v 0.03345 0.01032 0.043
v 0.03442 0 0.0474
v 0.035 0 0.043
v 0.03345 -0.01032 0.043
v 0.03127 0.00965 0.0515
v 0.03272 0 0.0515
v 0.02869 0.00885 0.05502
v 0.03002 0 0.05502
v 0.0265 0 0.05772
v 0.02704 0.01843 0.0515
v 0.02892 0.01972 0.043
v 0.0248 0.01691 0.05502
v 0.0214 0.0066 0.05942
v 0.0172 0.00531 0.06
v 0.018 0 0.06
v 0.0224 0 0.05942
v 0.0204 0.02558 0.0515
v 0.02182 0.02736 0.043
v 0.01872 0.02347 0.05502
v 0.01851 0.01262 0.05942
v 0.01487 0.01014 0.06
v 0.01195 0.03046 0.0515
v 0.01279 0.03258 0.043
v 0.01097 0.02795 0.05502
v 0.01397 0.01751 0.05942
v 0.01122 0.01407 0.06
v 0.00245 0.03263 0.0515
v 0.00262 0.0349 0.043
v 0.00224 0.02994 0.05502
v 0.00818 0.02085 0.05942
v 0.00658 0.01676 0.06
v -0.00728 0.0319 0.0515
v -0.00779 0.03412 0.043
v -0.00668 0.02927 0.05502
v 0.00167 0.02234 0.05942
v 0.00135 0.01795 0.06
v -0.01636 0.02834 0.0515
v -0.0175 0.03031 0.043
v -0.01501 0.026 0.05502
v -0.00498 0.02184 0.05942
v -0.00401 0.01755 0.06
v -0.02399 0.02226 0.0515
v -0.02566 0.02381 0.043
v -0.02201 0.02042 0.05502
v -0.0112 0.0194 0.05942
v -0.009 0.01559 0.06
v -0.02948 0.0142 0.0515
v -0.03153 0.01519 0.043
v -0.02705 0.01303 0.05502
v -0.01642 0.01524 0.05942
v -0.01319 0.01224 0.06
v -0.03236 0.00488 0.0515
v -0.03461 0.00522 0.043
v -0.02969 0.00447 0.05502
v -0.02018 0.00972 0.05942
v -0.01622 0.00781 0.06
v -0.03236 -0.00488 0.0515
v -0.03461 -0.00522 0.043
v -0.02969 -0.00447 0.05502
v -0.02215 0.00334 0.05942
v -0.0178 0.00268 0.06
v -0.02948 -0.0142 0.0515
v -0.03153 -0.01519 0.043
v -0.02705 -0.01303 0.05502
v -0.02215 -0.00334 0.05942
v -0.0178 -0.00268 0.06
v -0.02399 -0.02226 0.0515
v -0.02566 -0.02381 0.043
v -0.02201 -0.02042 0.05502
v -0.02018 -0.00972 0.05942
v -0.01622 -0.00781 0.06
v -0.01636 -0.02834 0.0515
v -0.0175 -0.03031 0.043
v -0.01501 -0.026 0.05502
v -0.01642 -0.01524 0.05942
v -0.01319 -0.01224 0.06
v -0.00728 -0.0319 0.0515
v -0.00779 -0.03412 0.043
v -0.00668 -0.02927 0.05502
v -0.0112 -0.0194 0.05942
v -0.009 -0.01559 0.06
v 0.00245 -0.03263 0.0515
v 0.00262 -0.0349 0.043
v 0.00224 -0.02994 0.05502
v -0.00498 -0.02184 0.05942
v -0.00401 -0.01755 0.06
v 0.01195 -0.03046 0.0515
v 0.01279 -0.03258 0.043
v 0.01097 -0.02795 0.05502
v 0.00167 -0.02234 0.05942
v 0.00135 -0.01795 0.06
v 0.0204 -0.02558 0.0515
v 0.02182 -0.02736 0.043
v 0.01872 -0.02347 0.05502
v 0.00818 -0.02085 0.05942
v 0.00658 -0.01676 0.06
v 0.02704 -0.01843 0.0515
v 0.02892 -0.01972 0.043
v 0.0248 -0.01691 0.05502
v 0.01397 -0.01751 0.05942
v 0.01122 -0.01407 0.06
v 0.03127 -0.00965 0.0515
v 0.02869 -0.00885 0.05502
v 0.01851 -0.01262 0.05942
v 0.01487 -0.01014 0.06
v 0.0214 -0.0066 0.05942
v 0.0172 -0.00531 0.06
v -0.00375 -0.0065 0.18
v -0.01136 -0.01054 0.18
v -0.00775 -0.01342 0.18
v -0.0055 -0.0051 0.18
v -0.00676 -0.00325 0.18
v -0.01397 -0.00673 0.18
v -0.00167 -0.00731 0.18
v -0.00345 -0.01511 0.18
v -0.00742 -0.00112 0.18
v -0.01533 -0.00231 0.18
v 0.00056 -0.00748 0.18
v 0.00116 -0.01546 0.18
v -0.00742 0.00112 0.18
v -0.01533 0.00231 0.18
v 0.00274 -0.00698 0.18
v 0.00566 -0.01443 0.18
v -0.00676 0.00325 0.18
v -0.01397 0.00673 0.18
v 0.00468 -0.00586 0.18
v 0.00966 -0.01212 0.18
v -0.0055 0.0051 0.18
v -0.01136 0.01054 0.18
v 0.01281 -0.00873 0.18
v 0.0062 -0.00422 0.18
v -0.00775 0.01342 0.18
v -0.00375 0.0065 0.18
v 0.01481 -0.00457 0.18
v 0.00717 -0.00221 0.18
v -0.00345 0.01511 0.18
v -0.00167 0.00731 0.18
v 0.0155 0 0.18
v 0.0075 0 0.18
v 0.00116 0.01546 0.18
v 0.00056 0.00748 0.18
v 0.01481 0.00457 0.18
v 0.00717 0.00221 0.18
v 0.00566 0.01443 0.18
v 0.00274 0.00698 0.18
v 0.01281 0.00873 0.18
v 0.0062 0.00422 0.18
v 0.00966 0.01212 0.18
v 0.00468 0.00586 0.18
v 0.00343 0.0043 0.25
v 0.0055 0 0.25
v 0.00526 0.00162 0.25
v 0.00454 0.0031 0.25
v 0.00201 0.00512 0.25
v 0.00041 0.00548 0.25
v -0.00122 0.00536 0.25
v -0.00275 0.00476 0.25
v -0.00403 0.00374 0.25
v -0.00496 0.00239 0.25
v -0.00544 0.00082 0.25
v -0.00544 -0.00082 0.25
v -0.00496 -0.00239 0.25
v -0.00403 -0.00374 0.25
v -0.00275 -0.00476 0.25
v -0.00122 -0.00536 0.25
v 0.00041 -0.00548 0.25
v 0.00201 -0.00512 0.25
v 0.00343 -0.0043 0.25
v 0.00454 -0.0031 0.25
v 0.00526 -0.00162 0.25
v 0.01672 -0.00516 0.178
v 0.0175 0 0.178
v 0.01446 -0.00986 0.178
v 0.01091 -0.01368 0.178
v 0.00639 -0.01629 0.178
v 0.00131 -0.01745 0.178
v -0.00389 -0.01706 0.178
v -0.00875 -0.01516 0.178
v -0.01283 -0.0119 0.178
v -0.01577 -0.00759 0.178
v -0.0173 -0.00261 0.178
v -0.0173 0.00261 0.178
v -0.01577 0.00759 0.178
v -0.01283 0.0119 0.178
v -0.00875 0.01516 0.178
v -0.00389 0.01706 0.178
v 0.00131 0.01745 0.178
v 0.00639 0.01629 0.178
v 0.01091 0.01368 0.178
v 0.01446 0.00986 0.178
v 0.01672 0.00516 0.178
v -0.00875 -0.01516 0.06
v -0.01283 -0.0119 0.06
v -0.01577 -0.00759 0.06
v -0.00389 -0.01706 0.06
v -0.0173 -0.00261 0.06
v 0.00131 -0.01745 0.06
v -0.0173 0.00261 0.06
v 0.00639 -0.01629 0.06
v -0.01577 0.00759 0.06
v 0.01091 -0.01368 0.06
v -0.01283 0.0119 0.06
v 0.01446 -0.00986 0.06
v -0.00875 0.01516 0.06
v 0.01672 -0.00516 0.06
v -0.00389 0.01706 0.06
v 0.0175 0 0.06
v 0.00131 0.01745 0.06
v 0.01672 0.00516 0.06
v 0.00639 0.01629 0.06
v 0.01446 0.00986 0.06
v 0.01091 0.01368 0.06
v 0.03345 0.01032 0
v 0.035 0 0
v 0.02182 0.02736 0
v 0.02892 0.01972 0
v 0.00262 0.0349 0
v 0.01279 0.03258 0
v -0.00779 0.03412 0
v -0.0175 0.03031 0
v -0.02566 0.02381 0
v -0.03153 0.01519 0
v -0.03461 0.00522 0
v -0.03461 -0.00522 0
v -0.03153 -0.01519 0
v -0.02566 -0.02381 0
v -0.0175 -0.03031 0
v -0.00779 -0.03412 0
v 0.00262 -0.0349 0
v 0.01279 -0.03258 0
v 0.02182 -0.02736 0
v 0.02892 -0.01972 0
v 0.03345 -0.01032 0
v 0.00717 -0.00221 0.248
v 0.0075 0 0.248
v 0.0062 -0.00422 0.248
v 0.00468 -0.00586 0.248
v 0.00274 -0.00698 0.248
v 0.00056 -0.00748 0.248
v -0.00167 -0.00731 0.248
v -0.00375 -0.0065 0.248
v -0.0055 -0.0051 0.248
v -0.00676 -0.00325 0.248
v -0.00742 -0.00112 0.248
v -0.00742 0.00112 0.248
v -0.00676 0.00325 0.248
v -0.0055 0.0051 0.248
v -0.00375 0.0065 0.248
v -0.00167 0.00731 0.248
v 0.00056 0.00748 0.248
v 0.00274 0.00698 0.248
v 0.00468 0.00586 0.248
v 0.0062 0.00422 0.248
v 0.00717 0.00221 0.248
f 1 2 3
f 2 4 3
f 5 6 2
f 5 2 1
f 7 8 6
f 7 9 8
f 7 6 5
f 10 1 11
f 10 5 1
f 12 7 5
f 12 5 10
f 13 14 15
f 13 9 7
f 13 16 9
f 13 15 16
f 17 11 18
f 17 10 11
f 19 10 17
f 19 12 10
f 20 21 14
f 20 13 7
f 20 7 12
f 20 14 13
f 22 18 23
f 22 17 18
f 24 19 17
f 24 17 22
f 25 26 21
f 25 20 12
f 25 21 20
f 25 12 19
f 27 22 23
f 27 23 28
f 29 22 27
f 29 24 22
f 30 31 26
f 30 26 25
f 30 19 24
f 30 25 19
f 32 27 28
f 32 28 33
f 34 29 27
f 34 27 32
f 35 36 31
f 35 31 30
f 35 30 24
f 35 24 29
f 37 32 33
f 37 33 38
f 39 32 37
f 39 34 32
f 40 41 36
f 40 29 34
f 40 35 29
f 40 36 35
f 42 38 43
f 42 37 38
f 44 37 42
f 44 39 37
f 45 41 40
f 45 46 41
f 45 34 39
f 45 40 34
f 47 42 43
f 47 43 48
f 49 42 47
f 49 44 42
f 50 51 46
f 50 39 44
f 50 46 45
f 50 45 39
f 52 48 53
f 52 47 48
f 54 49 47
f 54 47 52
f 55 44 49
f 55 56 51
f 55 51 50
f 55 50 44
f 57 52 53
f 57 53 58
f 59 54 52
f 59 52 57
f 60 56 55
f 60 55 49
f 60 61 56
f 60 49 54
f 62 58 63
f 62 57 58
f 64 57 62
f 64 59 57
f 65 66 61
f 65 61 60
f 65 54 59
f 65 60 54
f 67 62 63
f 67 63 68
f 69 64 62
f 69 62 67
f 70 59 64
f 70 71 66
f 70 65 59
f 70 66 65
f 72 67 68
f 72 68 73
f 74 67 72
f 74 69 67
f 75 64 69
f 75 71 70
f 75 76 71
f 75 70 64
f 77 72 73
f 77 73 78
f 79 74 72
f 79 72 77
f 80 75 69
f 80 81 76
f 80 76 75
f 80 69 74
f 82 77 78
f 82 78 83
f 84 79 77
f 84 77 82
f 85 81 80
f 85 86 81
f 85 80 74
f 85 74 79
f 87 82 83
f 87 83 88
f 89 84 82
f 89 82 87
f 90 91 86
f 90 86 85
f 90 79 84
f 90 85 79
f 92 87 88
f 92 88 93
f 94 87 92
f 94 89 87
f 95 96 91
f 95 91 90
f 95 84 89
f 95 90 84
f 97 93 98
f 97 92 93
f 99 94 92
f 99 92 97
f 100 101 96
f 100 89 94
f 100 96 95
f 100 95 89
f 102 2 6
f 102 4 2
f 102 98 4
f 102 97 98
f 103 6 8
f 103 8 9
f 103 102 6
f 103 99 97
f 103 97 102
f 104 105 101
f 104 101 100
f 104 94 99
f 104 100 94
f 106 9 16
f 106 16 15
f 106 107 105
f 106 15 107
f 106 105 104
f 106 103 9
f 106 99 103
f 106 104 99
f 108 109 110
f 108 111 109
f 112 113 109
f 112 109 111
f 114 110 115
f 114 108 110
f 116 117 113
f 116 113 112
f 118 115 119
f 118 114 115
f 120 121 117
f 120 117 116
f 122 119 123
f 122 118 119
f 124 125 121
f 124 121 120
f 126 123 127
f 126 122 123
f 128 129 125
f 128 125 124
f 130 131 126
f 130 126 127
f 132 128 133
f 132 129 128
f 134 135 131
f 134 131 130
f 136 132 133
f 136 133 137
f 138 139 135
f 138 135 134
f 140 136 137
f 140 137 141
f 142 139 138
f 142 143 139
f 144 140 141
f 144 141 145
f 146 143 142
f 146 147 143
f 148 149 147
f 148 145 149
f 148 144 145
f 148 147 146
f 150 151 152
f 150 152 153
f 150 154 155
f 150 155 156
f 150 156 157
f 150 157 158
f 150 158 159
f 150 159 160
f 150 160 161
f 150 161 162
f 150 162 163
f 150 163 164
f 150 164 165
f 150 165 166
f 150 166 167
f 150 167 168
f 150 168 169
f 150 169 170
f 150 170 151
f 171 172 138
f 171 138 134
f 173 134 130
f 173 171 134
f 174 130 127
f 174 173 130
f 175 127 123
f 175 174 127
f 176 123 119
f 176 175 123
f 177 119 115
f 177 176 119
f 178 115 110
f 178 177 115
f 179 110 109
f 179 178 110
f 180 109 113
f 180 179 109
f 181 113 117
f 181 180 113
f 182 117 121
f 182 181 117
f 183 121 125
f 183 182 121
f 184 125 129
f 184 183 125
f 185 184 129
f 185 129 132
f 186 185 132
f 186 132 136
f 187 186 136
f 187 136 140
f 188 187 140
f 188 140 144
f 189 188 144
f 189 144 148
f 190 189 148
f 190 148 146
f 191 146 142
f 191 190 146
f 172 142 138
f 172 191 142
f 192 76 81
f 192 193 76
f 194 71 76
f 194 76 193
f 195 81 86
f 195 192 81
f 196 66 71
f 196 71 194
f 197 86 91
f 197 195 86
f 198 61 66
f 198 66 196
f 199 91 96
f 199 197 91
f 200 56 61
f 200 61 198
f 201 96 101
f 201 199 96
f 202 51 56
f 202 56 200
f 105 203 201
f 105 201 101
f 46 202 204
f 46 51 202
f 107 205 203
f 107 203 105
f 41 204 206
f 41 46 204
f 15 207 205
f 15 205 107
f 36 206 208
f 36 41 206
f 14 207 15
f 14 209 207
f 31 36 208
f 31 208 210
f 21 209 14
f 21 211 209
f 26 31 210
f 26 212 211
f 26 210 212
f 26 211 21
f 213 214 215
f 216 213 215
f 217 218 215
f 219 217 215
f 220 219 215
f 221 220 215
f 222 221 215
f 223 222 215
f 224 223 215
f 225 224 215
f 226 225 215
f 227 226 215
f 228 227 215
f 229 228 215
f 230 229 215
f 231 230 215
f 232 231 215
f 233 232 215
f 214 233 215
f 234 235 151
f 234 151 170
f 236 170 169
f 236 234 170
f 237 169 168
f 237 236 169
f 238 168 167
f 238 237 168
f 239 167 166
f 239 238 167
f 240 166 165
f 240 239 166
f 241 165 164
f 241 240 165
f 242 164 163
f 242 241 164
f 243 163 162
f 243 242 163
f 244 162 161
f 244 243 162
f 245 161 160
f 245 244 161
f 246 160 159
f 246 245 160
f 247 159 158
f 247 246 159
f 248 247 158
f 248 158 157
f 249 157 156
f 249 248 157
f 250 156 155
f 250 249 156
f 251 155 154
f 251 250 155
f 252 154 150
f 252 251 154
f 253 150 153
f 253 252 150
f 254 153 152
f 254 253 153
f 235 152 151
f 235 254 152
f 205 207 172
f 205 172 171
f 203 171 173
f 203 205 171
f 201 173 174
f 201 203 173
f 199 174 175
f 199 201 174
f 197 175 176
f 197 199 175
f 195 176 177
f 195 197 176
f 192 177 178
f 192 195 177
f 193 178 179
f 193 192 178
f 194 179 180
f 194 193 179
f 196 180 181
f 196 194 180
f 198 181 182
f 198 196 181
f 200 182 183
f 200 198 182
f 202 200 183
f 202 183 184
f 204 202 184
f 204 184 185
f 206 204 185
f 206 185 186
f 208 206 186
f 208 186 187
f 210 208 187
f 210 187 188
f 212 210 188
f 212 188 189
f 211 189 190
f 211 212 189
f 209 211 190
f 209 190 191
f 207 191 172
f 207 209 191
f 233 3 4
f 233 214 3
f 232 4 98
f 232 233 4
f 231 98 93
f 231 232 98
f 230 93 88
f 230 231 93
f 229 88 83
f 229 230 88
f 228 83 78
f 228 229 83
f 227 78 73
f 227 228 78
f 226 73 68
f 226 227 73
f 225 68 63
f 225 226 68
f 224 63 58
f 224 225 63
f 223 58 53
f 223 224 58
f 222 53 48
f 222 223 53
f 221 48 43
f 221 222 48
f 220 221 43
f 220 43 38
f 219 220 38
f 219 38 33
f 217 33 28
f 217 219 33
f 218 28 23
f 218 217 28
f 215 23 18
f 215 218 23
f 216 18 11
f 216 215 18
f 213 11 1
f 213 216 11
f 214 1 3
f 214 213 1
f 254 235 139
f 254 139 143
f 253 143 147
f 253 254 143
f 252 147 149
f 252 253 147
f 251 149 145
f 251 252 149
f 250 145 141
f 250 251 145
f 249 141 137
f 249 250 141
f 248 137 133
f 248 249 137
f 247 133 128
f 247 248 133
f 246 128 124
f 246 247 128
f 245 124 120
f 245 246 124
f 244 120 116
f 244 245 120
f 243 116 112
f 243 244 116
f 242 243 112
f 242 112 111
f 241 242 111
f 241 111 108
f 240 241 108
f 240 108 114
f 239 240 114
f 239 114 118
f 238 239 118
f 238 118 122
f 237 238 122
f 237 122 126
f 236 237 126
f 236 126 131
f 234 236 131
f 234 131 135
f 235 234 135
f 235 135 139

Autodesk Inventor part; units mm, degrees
ref_plane "YZ Plane" through (0, 0, 0) normal (1, 0, 0) x (0, 1, 0)
ref_plane "XZ Plane" through (0, 0, 0) normal (0, 1, 0) x (-1, 0, 0)
ref_plane "XY Plane" through (0, 0, 0) normal (0, 0, 1) x (1, 0, 0)
sketch "Schizzo1" plane through (0, 0, 0) normal (0, 0, 1) x (1, 0, 0)
  circle A0 centre (0, 0) radius 0.035
  dimension "d0" = 0.07
extrude "Estrusione1" add sketch "Schizzo1" along normal blind 0.06
sketch "Schizzo6" plane through (0, 0, 0.06) normal (0, 0, 1) x (1, 0, 0)
  circle A0 centre (0, 0) radius 0.0175
  dimension "d20" = 0.035
extrude "Estrusione5" add sketch "Schizzo6" along normal blind 0.19
sketch "Schizzo7" plane through (0, 0, 0.25) normal (0, 0, 1) x (1, 0, 0)
  circle A0 centre (0, 0) radius 0.0175 projected
  circle A1 centre (0, 0) radius 0.0075
  dimension "d23" = 0.015
extrude "Estrusione6" cut sketch "Schizzo7" against normal blind 0.07
fillet "Raccordo4" radius 0.02 1 edges at (-0.035, 0, 0.06)
chamfer "Smusso2" distance 0.002 angle 45 2 edges at (-0.0175, 0, 0.18) (-0.0075, 0, 0.25)
properties part number "screwdriver" material "Acciaio inossidabile"
